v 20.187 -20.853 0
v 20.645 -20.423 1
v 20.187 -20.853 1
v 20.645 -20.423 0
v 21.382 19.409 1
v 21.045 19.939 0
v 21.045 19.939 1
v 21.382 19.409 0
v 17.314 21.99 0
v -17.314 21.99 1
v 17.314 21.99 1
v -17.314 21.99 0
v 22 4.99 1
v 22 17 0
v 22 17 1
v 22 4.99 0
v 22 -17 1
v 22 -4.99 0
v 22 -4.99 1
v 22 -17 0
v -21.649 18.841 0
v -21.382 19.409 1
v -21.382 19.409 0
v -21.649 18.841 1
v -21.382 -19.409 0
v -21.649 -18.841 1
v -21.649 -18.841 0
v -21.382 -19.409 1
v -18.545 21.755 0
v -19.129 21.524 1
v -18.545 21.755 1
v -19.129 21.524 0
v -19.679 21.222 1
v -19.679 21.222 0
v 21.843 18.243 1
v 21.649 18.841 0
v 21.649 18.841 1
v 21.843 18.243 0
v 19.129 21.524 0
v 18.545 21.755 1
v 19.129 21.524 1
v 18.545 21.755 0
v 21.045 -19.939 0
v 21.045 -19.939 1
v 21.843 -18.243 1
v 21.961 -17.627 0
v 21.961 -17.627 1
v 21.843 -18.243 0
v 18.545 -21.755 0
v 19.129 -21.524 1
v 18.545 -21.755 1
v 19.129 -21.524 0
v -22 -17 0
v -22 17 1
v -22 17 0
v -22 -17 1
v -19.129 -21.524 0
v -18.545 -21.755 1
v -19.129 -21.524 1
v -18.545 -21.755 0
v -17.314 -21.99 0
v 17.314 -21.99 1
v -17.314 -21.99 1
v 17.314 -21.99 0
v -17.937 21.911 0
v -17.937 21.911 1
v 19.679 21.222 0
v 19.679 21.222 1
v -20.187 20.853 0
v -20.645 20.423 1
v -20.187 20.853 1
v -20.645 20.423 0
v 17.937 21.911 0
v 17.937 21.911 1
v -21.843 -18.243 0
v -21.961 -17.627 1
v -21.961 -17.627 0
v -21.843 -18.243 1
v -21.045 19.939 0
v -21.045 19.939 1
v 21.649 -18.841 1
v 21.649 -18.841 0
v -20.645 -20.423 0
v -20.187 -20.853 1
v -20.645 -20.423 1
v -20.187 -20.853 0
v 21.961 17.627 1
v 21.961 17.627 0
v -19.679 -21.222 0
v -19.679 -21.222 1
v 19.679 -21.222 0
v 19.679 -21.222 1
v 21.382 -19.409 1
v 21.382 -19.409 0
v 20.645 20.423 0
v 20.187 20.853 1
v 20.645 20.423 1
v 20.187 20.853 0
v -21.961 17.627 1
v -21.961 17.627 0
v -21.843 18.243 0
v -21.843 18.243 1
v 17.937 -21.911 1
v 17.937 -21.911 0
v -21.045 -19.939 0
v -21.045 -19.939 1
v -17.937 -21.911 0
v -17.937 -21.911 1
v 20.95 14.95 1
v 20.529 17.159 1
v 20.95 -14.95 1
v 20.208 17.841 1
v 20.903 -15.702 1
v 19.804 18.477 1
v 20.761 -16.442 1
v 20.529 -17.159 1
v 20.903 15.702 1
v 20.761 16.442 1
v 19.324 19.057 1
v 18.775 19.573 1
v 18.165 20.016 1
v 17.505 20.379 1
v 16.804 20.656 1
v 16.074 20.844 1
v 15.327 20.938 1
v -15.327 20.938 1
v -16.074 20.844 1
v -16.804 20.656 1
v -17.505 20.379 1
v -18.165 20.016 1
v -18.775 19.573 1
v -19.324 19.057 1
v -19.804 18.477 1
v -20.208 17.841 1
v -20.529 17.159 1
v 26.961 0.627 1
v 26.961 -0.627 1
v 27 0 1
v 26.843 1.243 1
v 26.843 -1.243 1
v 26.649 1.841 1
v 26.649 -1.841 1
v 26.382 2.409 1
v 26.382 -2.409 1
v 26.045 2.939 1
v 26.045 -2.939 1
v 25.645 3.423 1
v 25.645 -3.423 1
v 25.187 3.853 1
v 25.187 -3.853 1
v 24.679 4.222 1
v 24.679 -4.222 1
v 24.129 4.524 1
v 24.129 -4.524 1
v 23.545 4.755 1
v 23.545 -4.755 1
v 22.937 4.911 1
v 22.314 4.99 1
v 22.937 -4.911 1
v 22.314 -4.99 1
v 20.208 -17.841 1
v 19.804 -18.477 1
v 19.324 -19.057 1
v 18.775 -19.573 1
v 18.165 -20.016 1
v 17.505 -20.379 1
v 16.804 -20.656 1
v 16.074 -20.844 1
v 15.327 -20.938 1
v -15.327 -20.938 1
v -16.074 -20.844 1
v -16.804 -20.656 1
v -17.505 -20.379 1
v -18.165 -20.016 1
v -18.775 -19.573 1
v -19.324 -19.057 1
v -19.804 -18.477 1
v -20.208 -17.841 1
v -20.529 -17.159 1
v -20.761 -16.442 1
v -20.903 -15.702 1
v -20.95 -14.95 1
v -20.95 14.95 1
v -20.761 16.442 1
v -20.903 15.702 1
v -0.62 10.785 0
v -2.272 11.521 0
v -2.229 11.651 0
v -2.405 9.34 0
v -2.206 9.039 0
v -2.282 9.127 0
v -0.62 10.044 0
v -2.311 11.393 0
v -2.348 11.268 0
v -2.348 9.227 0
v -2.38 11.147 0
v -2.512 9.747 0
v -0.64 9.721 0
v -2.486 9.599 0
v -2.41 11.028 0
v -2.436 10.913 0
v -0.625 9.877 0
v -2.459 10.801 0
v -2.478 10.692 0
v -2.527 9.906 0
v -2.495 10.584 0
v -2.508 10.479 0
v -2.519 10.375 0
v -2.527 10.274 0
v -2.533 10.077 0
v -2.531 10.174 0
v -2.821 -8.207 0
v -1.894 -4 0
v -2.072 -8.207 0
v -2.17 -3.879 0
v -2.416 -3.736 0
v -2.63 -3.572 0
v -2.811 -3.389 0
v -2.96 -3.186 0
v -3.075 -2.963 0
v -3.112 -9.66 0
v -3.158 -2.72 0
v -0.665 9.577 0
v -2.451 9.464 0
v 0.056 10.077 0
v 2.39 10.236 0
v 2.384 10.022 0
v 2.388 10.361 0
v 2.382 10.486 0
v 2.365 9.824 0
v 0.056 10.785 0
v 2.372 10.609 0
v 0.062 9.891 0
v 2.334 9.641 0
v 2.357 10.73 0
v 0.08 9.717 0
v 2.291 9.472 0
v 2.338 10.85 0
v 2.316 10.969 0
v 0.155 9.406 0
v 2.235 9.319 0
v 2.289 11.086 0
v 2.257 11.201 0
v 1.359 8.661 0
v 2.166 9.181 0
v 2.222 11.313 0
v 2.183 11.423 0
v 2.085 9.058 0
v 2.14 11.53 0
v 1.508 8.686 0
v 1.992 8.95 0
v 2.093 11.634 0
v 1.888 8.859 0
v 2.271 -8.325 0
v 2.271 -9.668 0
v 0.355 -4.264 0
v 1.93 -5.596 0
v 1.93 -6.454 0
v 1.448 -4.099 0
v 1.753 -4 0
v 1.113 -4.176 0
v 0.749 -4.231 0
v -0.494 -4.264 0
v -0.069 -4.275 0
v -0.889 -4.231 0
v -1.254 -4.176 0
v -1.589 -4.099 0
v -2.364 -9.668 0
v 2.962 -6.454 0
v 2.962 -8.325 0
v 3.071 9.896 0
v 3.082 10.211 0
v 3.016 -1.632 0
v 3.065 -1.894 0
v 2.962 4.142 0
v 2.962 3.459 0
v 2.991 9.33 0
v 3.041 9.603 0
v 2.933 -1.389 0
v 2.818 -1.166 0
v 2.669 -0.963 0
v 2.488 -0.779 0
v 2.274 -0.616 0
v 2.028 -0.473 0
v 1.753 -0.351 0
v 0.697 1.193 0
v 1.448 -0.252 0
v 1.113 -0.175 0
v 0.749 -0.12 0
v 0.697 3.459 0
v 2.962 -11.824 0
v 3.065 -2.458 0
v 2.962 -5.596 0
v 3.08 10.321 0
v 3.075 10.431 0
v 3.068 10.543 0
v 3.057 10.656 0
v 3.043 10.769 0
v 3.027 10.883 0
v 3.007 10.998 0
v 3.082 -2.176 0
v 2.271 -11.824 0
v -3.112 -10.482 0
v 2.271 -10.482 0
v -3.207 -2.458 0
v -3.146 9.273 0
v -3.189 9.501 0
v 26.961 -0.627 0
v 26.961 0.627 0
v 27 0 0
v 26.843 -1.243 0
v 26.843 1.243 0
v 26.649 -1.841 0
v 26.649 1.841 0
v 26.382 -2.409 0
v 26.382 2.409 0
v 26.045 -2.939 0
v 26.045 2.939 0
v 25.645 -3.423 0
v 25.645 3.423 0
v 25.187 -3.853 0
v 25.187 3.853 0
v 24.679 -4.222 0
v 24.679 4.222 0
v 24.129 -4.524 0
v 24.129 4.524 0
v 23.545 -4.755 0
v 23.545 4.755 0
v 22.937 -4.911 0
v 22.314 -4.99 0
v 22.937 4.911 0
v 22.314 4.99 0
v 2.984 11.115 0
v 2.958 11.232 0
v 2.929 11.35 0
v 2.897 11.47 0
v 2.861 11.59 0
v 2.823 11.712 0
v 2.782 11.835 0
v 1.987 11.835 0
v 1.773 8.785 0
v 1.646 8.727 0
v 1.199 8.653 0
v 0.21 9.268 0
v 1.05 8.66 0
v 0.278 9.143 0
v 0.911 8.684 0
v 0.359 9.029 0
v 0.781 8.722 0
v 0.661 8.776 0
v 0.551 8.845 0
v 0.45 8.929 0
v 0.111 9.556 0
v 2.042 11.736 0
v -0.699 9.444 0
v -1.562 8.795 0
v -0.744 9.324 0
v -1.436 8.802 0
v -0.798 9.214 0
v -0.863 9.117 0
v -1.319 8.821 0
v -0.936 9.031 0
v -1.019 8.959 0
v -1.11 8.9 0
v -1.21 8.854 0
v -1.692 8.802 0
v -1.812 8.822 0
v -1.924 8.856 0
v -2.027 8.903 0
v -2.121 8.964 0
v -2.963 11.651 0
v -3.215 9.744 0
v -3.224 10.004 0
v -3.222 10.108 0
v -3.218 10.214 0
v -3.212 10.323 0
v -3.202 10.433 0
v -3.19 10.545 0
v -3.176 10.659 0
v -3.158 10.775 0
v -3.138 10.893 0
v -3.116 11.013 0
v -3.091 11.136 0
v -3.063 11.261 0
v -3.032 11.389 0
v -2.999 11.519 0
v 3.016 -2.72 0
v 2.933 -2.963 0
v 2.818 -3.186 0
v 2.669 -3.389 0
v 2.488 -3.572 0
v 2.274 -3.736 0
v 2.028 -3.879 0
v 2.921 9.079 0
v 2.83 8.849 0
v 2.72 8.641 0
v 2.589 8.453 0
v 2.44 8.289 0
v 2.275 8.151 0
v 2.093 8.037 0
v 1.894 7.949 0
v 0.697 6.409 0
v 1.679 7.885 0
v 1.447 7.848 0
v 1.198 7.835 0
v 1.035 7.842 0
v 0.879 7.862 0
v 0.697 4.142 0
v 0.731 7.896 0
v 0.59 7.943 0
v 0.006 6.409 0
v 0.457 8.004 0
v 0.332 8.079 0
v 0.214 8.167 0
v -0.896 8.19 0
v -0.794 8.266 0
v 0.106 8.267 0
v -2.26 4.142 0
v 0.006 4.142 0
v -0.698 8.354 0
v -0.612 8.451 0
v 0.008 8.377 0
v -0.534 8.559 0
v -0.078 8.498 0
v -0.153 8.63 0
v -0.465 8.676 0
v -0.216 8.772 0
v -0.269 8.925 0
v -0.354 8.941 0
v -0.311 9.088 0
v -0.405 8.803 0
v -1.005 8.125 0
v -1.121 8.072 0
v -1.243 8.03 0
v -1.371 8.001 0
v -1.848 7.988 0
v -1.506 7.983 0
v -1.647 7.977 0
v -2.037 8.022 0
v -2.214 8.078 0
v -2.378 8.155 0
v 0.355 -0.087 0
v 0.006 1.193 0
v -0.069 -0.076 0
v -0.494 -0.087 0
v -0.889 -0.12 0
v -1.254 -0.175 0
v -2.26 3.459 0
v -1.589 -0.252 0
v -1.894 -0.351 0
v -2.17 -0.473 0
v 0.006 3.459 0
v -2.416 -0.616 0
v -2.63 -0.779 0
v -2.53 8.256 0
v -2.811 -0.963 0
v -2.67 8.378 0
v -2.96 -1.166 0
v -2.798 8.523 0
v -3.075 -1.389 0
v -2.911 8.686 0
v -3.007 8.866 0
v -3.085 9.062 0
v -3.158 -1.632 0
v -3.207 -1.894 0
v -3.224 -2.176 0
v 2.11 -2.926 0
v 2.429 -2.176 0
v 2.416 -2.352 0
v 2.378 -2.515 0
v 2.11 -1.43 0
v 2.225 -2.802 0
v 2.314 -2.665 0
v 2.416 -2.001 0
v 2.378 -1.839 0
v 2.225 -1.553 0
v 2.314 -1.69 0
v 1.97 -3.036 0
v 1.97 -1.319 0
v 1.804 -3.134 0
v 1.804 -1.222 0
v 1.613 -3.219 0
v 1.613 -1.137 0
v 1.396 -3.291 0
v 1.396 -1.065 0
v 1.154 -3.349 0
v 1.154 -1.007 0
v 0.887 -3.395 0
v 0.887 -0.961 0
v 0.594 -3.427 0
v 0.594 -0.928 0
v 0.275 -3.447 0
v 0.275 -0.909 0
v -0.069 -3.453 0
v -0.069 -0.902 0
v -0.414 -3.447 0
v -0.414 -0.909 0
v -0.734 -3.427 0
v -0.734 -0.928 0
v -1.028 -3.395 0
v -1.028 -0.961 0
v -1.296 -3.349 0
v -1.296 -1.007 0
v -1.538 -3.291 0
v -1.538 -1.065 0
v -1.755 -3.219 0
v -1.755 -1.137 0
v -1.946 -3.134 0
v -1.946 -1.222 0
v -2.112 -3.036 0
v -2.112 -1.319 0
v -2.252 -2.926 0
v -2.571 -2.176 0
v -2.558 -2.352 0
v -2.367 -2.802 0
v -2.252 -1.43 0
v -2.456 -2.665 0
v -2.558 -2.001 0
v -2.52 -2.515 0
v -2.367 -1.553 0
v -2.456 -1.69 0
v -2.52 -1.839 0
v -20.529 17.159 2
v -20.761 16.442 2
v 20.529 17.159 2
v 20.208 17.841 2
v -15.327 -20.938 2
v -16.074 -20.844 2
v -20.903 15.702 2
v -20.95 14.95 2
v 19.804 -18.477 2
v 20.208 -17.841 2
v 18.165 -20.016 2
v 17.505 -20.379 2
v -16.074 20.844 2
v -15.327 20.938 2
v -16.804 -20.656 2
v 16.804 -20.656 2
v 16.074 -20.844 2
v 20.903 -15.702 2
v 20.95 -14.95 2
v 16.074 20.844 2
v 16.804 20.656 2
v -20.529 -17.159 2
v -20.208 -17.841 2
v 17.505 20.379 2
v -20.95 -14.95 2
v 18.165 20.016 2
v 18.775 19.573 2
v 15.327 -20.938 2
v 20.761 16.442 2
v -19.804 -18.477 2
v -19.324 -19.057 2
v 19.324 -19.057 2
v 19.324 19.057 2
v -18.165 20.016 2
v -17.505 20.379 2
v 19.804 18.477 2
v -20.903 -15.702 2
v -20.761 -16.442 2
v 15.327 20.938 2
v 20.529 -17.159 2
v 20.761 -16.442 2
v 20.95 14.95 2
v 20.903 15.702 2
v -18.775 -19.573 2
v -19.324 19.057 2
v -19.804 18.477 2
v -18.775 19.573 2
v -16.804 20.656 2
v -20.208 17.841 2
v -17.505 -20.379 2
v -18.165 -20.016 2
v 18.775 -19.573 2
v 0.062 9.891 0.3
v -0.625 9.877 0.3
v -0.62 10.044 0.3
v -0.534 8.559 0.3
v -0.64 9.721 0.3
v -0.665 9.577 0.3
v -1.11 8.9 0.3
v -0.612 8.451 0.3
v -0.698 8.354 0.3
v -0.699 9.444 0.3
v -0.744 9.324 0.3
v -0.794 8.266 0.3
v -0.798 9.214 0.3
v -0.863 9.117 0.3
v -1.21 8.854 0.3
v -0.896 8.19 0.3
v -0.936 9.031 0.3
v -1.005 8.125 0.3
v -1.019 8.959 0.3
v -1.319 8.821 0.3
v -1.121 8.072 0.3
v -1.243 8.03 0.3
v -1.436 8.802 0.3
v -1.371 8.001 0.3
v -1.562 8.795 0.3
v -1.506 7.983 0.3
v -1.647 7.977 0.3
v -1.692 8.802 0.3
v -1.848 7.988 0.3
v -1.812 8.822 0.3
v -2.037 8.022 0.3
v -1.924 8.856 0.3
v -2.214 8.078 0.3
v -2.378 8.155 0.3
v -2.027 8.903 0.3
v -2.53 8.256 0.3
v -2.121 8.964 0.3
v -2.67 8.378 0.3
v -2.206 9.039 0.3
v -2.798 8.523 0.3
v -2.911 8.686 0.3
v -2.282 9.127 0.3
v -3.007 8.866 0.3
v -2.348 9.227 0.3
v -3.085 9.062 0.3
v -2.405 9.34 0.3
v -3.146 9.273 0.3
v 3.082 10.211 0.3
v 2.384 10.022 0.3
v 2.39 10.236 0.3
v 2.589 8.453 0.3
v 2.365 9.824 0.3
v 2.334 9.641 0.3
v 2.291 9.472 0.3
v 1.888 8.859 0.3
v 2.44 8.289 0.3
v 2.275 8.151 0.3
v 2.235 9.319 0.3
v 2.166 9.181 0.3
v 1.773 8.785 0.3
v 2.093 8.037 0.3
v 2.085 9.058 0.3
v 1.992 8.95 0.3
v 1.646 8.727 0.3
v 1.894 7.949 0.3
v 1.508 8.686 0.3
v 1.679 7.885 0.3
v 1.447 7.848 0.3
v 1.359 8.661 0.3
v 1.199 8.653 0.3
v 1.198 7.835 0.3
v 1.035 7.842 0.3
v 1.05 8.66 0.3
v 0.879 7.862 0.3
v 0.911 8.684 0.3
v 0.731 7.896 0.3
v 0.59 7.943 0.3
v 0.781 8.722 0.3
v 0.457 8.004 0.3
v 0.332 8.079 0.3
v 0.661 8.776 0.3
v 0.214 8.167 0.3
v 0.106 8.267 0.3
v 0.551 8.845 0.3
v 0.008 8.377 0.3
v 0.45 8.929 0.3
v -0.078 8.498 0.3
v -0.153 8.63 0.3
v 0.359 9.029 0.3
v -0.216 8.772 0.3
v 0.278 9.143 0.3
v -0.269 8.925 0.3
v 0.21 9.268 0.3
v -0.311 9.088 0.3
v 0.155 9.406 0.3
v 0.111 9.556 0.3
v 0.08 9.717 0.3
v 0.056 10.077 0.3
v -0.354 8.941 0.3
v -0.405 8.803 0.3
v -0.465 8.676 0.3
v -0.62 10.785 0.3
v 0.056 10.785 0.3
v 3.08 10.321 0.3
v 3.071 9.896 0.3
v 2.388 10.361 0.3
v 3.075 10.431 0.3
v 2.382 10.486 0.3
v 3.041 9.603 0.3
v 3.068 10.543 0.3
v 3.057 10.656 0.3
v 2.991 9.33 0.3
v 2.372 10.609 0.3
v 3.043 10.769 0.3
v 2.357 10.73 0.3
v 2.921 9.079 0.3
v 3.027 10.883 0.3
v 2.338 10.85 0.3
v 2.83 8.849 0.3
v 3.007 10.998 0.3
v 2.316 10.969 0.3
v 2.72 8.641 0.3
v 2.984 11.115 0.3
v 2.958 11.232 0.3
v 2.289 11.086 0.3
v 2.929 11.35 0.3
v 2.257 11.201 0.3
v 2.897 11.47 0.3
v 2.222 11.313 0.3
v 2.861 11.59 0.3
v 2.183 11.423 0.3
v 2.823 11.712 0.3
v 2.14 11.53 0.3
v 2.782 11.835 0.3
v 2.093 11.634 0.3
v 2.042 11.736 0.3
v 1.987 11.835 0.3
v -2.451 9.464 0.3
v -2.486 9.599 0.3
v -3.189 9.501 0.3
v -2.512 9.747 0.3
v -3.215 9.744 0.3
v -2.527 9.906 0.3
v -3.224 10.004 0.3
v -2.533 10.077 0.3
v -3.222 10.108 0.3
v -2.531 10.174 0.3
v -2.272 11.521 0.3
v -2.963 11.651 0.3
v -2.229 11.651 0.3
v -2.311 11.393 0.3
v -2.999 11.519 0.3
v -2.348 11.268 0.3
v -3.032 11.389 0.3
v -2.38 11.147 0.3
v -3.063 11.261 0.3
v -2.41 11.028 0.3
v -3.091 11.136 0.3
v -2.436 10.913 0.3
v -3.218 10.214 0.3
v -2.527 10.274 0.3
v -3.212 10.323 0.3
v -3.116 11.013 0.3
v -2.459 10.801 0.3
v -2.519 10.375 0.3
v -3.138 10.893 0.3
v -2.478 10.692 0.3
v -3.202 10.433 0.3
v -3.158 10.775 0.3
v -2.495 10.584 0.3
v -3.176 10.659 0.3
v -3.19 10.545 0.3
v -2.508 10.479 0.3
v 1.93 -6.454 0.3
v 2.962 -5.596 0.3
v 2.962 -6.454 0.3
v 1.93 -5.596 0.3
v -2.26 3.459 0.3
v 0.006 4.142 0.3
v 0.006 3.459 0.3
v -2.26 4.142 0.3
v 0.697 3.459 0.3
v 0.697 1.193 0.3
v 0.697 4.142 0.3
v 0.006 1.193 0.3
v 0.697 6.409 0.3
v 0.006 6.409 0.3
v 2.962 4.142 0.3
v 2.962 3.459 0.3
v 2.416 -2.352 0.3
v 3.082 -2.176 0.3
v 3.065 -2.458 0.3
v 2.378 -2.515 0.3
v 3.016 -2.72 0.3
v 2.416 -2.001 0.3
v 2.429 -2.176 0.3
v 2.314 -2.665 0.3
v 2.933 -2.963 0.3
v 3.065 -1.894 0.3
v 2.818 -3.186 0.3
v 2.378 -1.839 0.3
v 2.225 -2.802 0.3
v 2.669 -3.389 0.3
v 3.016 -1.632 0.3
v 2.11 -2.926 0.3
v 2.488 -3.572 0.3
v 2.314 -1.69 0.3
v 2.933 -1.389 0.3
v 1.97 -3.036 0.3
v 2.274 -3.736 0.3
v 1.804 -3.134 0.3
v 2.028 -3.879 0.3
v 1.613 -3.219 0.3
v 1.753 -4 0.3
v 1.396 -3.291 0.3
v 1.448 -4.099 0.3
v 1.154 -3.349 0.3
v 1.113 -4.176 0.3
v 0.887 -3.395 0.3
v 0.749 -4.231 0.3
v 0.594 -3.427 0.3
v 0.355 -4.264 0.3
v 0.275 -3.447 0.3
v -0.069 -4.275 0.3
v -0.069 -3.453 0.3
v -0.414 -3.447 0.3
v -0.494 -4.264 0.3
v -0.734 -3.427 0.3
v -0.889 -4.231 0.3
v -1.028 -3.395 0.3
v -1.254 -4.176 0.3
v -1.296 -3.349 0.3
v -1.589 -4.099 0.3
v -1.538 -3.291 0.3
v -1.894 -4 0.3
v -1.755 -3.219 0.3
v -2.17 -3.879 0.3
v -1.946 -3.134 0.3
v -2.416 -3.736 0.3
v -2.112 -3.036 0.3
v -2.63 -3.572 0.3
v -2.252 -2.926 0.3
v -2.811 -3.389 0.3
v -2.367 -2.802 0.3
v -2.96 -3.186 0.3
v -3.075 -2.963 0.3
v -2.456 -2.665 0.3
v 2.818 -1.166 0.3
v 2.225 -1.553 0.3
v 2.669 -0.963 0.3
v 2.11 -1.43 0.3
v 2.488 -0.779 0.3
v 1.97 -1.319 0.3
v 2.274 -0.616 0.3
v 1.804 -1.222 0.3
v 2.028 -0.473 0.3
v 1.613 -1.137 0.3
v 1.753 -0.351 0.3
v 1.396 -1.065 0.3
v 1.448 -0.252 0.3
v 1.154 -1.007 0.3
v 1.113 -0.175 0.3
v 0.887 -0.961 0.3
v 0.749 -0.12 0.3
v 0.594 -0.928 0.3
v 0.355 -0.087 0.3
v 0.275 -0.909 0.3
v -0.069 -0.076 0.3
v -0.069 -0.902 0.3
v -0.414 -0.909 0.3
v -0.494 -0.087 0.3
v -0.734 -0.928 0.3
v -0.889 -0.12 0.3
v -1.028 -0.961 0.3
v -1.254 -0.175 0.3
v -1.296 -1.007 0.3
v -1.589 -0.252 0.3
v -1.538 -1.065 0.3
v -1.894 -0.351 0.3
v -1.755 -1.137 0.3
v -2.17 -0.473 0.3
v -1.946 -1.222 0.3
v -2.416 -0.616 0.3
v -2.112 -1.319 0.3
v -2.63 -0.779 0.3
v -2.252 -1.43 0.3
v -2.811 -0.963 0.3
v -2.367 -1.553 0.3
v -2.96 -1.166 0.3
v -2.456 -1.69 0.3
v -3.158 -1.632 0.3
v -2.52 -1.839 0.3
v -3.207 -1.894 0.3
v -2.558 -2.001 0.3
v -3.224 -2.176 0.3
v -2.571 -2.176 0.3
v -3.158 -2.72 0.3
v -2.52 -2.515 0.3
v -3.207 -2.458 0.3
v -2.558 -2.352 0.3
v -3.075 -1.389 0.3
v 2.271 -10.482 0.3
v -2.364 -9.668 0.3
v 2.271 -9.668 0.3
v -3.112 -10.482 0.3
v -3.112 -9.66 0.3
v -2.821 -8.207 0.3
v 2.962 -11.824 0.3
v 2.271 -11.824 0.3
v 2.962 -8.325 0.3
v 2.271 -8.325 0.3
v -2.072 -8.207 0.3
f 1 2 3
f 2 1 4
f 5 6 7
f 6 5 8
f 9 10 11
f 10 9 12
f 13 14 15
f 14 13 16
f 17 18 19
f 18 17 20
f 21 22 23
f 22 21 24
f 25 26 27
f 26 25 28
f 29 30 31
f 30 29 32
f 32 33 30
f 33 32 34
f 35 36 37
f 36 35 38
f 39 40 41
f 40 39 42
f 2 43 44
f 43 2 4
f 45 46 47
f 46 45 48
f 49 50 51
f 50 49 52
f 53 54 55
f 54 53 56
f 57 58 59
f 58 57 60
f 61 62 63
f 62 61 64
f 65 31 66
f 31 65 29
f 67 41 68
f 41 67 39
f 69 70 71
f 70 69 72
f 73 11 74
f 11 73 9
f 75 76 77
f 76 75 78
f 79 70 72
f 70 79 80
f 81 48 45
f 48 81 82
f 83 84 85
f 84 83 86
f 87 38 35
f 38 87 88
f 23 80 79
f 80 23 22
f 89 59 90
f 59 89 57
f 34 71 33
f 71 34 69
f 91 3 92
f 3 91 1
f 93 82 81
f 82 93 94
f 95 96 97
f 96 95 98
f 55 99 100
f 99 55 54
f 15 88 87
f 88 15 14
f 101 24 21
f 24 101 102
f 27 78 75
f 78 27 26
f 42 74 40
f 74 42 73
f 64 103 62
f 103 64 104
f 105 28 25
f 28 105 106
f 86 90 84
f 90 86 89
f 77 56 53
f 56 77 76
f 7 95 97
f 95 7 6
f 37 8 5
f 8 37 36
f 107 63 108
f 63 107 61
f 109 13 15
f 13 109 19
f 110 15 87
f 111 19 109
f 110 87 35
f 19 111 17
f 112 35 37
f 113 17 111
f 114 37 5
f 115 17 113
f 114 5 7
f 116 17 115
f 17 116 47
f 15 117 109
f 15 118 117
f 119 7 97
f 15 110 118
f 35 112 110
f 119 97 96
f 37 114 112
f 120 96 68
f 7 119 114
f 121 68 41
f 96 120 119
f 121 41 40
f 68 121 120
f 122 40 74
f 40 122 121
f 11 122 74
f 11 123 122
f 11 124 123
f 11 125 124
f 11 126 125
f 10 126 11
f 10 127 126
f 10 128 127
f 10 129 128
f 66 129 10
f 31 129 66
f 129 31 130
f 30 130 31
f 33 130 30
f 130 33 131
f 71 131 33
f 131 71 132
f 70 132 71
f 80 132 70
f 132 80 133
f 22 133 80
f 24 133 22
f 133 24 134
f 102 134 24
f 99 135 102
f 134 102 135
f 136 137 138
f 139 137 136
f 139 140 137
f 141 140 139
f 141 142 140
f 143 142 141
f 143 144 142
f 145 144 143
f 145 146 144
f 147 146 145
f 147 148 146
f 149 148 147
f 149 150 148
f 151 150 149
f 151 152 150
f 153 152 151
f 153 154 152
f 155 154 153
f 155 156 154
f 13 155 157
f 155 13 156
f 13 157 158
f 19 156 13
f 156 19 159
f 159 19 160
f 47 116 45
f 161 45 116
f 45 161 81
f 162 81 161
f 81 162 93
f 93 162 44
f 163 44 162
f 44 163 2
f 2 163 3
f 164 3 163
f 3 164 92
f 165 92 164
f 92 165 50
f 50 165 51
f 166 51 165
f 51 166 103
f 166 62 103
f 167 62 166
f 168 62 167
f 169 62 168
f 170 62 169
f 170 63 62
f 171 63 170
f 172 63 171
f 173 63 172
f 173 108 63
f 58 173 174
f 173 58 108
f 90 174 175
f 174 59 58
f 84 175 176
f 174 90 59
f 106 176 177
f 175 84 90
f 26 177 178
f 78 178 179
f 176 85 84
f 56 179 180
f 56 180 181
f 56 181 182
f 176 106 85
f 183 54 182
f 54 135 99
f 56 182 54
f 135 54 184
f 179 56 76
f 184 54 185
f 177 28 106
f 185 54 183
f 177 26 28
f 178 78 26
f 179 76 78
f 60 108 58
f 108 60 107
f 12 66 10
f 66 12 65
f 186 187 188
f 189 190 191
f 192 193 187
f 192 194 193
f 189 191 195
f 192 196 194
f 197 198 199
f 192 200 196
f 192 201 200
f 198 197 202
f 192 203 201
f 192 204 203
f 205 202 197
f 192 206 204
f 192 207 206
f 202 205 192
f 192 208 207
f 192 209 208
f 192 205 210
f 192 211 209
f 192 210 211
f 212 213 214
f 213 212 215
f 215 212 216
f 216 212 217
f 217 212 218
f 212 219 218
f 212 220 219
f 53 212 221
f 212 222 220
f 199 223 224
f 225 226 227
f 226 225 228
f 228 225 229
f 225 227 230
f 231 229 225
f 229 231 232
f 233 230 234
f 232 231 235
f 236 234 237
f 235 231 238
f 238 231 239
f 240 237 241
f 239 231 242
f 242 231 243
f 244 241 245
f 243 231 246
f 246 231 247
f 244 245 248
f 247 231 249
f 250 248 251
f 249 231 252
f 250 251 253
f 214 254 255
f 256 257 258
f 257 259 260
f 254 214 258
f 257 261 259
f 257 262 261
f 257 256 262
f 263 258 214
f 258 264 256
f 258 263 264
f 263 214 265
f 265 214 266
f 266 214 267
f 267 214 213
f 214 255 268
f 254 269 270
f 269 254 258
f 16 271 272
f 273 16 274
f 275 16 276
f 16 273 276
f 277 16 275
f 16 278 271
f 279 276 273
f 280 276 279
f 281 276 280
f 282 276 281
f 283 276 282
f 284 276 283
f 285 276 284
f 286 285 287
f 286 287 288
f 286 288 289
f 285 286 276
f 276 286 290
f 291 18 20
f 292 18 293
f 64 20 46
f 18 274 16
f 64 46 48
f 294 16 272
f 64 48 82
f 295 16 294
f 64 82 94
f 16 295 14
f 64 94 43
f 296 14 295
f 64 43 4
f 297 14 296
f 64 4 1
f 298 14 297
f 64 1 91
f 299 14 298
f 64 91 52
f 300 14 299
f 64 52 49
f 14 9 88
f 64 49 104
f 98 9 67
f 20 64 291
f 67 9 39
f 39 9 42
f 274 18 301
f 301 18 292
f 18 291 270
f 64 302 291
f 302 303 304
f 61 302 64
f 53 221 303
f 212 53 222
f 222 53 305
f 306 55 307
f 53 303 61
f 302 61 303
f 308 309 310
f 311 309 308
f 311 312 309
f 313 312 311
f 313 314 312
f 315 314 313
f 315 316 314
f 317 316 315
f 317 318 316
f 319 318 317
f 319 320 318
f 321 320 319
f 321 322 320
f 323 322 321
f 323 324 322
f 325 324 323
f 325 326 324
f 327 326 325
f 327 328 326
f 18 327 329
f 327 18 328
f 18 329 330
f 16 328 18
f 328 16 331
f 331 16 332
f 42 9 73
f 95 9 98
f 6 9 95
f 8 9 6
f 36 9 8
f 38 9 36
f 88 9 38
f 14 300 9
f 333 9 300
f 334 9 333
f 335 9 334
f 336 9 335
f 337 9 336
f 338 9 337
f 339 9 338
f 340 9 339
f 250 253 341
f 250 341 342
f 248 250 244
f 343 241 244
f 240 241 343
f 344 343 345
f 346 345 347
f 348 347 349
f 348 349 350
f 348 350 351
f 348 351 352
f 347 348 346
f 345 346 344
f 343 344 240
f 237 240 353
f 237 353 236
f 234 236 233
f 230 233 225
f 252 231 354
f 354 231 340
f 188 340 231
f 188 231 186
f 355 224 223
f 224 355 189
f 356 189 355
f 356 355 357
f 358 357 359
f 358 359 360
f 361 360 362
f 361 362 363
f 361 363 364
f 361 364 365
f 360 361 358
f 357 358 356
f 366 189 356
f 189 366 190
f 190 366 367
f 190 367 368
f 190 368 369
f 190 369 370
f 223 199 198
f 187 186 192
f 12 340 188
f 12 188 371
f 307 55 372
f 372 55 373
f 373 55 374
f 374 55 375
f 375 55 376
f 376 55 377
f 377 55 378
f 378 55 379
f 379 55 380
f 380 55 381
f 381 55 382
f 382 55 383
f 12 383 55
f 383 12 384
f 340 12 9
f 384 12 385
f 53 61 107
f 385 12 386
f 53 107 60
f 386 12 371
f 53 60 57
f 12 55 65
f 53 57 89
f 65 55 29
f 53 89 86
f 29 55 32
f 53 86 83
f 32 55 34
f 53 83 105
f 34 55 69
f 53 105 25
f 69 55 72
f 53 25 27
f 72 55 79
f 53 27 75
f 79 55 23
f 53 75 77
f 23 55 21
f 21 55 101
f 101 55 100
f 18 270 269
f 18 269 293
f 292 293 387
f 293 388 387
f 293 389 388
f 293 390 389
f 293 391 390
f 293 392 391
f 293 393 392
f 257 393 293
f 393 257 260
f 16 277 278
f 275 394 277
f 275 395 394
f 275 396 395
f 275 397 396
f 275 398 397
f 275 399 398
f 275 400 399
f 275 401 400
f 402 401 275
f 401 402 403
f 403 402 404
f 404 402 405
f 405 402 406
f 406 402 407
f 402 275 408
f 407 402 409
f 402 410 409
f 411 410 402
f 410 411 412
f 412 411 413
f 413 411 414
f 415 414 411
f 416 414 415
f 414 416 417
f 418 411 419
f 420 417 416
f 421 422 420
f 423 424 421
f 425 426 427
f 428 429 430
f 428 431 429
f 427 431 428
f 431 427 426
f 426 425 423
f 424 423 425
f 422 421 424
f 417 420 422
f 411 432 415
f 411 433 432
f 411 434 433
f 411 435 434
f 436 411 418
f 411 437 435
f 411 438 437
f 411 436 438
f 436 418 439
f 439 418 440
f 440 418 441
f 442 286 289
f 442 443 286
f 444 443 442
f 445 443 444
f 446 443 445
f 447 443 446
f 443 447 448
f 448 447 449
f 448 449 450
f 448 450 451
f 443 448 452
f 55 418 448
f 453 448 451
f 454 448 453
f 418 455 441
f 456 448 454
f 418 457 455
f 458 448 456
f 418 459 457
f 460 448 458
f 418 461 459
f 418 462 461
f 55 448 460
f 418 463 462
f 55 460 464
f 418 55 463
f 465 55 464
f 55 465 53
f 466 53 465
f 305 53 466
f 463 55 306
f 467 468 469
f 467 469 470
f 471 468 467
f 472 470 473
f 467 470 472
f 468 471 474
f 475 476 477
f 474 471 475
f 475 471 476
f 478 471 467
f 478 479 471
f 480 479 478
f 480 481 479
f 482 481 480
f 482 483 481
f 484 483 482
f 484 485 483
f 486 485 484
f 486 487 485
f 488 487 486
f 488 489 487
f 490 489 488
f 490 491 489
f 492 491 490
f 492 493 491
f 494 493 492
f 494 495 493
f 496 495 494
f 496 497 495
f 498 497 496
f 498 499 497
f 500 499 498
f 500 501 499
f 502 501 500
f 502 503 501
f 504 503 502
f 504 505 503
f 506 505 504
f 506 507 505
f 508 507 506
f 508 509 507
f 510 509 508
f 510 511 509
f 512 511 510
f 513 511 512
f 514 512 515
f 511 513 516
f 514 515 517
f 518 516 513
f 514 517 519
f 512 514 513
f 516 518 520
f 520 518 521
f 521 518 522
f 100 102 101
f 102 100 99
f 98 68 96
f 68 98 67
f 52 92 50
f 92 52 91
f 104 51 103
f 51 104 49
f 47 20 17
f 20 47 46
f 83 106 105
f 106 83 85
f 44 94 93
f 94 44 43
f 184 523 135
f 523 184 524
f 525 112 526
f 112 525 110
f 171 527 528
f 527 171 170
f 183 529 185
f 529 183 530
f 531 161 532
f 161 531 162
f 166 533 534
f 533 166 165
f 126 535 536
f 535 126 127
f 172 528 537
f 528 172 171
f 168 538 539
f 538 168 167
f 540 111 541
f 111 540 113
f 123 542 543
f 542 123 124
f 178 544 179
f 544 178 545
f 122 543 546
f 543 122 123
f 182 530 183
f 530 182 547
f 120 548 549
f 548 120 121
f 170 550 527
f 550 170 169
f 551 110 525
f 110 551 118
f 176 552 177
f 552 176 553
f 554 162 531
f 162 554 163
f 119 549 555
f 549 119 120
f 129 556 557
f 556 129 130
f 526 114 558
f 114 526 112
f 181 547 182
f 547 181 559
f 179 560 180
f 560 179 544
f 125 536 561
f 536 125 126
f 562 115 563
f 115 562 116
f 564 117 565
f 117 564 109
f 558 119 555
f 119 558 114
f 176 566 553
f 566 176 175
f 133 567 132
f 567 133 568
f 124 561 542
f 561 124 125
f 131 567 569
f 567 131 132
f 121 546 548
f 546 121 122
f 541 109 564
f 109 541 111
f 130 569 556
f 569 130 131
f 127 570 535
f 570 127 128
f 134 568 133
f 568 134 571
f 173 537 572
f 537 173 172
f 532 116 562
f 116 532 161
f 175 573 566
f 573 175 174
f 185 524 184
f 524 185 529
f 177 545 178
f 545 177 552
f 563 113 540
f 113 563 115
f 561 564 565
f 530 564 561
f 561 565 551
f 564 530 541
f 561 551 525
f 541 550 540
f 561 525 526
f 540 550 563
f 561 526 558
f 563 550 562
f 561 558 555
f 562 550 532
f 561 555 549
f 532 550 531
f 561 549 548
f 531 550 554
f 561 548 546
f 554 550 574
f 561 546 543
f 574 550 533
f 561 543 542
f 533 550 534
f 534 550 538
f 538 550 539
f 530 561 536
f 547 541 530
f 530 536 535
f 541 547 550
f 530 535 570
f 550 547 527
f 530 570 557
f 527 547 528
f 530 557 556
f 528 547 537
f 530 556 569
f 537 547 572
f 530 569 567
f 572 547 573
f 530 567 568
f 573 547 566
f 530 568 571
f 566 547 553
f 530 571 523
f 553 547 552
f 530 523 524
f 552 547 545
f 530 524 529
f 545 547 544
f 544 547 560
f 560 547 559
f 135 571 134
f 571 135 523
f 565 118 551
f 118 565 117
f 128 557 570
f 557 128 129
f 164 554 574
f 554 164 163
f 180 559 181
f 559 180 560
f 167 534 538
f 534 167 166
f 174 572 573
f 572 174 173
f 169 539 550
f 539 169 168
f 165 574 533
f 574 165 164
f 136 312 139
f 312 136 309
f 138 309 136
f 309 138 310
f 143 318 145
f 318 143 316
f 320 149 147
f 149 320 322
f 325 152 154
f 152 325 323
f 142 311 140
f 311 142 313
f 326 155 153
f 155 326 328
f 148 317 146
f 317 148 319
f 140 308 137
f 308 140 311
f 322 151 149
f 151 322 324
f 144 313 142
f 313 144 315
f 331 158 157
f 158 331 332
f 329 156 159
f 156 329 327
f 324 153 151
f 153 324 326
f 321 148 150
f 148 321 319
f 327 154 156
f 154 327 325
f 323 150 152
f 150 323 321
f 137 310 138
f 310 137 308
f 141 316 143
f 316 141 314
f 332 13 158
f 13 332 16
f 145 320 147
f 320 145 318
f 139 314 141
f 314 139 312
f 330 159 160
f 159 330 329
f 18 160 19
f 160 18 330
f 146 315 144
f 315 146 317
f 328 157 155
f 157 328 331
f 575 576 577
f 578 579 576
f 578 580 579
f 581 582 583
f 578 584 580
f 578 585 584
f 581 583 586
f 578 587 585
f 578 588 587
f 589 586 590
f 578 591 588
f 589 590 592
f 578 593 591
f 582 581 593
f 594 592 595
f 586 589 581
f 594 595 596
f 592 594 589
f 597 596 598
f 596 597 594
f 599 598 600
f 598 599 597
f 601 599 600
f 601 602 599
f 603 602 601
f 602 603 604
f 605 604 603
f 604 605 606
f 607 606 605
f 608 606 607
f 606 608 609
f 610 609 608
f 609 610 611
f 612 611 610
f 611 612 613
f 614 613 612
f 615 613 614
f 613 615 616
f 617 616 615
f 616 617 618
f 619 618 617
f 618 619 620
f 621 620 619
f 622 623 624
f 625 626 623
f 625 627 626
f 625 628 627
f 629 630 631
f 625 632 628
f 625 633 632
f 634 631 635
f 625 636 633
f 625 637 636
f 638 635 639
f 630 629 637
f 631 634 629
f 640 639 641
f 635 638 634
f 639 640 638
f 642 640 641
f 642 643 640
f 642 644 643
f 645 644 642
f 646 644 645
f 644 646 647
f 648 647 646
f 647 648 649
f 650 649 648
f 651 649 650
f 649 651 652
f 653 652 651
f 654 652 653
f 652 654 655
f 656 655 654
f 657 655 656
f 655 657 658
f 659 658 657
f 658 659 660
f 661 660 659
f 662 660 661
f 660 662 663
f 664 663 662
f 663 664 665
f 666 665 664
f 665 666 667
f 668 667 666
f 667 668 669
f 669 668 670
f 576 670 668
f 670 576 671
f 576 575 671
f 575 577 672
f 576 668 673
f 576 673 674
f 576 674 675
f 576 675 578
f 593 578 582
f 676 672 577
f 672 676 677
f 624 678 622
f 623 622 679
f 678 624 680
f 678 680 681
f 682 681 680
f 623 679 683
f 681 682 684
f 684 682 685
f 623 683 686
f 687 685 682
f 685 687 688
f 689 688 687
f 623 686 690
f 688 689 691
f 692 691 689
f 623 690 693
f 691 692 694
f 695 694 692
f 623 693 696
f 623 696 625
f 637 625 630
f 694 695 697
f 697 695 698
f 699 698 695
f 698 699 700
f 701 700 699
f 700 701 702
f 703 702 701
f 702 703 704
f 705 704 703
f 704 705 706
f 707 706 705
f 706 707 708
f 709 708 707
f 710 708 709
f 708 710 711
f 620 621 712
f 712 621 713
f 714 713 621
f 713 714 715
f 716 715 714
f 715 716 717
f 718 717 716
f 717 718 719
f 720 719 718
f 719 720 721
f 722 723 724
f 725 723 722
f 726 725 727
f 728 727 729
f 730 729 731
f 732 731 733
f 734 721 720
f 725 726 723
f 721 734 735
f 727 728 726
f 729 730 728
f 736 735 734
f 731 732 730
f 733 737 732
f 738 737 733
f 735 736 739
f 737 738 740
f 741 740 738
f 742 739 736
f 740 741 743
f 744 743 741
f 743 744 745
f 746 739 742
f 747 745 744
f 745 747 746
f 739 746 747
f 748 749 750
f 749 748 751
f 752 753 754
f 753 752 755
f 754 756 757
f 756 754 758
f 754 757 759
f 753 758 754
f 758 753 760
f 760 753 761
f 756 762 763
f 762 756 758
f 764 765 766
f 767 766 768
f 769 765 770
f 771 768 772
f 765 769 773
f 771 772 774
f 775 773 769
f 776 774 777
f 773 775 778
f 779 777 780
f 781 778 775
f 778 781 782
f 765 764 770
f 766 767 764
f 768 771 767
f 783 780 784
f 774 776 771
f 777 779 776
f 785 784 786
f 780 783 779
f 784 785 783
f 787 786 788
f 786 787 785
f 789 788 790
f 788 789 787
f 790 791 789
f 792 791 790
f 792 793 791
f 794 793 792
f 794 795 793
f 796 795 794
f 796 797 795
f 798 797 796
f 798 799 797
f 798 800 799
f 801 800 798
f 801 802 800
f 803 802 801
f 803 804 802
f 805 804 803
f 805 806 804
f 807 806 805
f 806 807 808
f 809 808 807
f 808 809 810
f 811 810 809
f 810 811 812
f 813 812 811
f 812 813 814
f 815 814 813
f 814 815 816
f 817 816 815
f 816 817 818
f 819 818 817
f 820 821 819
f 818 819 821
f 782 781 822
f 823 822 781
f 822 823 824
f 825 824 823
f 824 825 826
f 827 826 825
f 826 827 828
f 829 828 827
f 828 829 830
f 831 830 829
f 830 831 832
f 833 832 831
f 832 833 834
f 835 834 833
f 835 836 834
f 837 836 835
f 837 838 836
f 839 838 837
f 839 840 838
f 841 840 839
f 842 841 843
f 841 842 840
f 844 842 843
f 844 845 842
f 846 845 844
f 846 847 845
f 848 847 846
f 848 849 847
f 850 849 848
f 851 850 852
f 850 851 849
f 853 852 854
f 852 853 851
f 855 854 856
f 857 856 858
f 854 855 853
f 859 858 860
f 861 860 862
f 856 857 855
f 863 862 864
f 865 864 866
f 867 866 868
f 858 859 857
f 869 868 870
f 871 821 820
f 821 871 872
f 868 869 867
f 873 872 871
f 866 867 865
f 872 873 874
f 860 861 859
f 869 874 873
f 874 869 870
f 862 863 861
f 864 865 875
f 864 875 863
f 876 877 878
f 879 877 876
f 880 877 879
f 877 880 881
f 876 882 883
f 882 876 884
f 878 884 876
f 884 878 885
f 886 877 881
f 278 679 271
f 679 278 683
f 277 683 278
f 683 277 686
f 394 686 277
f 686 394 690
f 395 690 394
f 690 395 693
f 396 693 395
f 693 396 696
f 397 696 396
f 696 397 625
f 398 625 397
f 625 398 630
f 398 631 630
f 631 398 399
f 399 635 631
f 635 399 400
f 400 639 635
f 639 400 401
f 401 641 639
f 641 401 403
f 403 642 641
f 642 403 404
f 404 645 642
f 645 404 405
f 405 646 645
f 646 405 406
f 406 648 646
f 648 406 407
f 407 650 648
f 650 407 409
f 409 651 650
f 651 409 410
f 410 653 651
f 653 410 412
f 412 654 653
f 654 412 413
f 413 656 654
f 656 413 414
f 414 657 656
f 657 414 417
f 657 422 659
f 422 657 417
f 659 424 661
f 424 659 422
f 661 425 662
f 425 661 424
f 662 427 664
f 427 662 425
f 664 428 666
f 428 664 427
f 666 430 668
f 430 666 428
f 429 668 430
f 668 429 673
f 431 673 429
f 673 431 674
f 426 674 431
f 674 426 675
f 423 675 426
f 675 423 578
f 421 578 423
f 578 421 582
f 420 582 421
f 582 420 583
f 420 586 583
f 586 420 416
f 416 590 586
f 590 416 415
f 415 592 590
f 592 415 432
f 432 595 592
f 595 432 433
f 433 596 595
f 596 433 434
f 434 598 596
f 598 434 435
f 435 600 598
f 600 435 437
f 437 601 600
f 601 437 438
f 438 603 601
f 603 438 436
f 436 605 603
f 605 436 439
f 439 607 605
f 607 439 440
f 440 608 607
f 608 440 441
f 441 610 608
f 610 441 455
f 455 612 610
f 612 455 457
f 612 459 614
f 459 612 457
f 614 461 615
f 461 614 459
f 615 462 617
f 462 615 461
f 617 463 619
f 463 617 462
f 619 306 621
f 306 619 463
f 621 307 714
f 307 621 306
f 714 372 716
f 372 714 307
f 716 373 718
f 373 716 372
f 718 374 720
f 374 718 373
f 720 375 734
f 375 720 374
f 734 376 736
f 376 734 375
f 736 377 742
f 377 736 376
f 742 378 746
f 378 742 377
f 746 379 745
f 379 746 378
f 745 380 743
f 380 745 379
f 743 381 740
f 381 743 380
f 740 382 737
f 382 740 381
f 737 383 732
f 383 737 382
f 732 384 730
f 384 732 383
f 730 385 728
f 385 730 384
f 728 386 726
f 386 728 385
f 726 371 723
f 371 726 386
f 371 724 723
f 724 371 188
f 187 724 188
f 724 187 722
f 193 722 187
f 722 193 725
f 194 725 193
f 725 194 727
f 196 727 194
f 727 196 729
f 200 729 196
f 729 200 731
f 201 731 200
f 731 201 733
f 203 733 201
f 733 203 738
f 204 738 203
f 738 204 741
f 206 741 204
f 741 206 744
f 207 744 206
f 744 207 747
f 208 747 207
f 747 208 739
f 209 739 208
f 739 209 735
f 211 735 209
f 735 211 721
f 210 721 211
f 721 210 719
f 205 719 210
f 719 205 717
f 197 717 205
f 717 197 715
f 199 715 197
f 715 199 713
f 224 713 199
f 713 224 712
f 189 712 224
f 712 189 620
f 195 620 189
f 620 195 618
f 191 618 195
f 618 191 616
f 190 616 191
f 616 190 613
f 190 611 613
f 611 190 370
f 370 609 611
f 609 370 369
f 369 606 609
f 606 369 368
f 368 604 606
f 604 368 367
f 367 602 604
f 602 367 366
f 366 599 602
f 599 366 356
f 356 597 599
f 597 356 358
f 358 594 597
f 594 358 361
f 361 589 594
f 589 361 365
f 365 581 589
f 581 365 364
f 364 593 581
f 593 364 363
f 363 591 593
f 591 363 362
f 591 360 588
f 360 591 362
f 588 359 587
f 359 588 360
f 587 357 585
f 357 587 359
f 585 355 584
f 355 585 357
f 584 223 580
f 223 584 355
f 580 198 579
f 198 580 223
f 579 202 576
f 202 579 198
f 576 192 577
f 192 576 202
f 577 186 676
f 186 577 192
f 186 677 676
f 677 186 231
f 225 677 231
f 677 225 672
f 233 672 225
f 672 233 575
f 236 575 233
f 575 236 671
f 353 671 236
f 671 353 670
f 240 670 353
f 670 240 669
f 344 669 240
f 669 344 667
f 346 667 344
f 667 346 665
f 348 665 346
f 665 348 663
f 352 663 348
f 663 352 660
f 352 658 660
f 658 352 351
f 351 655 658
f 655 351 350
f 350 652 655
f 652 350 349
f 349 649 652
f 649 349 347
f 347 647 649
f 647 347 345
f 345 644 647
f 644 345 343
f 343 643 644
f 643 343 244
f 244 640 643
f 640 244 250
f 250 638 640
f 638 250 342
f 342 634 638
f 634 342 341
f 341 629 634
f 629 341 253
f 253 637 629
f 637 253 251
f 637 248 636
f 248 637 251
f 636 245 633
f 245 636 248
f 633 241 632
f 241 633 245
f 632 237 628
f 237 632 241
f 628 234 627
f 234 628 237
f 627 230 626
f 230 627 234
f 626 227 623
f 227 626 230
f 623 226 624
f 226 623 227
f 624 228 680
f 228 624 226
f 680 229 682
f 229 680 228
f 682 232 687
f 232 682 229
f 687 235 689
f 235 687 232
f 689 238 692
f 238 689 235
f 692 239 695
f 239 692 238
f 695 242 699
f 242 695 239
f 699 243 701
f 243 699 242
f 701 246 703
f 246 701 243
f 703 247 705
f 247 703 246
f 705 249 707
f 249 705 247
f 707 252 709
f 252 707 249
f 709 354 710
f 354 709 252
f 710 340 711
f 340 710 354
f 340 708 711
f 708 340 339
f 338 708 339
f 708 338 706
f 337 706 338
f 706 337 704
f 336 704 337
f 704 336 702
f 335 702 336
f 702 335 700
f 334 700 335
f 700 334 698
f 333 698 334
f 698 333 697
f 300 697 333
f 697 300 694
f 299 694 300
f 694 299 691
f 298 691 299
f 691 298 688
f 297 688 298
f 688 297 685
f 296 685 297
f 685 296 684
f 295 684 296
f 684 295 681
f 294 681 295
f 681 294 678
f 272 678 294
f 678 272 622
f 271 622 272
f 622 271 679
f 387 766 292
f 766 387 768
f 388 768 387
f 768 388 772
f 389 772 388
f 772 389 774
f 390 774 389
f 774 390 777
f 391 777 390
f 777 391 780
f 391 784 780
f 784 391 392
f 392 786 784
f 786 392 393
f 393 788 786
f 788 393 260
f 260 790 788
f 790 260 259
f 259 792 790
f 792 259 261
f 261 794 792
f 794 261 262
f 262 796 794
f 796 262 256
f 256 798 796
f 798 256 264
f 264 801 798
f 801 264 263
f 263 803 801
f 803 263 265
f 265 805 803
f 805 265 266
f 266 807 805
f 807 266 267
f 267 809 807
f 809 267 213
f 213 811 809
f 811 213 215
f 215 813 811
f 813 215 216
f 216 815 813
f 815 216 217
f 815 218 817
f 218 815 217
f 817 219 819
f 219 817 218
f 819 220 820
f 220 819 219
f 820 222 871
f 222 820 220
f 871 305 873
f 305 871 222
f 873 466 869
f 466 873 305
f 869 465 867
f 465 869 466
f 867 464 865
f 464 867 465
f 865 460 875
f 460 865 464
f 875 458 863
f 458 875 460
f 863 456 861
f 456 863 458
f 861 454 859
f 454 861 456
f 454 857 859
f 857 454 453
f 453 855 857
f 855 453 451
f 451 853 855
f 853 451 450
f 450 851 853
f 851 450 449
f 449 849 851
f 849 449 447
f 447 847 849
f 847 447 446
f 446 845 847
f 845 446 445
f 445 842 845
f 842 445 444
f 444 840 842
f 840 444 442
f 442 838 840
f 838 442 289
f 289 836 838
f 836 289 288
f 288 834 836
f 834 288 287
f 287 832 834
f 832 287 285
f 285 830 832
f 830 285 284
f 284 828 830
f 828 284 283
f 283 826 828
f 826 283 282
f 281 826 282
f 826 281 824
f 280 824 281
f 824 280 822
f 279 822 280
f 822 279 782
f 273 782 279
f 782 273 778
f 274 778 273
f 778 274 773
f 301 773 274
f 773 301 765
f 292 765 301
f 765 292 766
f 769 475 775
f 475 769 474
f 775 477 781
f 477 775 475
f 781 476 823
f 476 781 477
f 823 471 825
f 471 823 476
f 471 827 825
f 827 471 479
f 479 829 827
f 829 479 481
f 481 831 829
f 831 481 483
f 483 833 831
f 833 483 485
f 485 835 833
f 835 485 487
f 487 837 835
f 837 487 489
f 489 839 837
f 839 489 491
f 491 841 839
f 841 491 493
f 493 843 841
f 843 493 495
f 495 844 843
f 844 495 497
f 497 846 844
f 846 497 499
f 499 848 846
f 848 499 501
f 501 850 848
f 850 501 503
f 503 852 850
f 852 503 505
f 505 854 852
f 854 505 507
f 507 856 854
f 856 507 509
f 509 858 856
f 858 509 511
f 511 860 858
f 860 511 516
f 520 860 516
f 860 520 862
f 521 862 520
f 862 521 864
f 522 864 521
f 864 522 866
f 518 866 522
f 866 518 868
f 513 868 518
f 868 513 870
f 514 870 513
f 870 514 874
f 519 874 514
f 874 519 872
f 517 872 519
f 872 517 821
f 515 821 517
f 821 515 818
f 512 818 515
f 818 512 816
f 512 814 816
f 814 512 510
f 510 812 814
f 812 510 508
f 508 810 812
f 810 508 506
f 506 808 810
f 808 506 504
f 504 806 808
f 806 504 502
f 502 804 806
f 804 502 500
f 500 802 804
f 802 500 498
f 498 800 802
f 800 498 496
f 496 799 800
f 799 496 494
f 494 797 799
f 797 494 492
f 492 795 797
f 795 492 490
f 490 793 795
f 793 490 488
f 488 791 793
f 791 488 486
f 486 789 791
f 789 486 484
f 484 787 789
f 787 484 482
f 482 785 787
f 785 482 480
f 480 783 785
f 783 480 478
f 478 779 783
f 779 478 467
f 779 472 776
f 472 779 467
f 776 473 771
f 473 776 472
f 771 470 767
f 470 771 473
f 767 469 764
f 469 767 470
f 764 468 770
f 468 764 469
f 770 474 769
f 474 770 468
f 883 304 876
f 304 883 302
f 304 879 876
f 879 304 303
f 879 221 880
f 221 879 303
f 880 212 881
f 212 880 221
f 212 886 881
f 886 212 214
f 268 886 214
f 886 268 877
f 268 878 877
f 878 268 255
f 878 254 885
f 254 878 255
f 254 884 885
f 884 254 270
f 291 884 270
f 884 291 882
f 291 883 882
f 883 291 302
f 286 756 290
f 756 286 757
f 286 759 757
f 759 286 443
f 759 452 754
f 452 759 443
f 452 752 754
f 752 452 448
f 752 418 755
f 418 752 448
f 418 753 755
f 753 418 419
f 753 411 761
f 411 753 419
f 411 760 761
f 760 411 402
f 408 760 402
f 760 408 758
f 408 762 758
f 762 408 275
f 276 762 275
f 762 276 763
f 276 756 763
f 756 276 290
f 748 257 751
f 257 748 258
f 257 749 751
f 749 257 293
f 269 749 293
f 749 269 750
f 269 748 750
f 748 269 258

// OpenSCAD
$fn = 50;


difference() {
	union() {
		translate(v = [0, 0, 0]) {
			rotate(a = [0, 0, 0]) {
				hull() {
					translate(v = [-17.0000000000, 17.0000000000, 0]) {
						rotate(a = [0, 0, 0]) {
							translate(v = [0, 0, 0]) {
								rotate(a = [0, 0, 0]) {
									cylinder(h = 1, r = 5);
								}
							}
						}
					}
					translate(v = [17.0000000000, 17.0000000000, 0]) {
						rotate(a = [0, 0, 0]) {
							translate(v = [0, 0, 0]) {
								rotate(a = [0, 0, 0]) {
									cylinder(h = 1, r = 5);
								}
							}
						}
					}
					translate(v = [-17.0000000000, -17.0000000000, 0]) {
						rotate(a = [0, 0, 0]) {
							translate(v = [0, 0, 0]) {
								rotate(a = [0, 0, 0]) {
									cylinder(h = 1, r = 5);
								}
							}
						}
					}
					translate(v = [17.0000000000, -17.0000000000, 0]) {
						rotate(a = [0, 0, 0]) {
							translate(v = [0, 0, 0]) {
								rotate(a = [0, 0, 0]) {
									cylinder(h = 1, r = 5);
								}
							}
						}
					}
				}
			}
		}
		translate(v = [0, 0, 0]) {
			rotate(a = [0, 0, 0]) {
				hull() {
					translate(v = [-14.9500000000, 14.9500000000, 0]) {
						rotate(a = [0, 0, 0]) {
							translate(v = [0, 0, 0]) {
								rotate(a = [0, 0, 0]) {
									cylinder(h = 2, r = 6);
								}
							}
						}
					}
					translate(v = [14.9500000000, 14.9500000000, 0]) {
						rotate(a = [0, 0, 0]) {
							translate(v = [0, 0, 0]) {
								rotate(a = [0, 0, 0]) {
									cylinder(h = 2, r = 6);
								}
							}
						}
					}
					translate(v = [-14.9500000000, -14.9500000000, 0]) {
						rotate(a = [0, 0, 0]) {
							translate(v = [0, 0, 0]) {
								rotate(a = [0, 0, 0]) {
									cylinder(h = 2, r = 6);
								}
							}
						}
					}
					translate(v = [14.9500000000, -14.9500000000, 0]) {
						rotate(a = [0, 0, 0]) {
							translate(v = [0, 0, 0]) {
								rotate(a = [0, 0, 0]) {
									cylinder(h = 2, r = 6);
								}
							}
						}
					}
				}
			}
		}
		translate(v = [22.0000000000, 0, 0.0000000000]) {
			rotate(a = [0, 0, 0]) {
				cylinder(h = 1, r = 5);
			}
		}
	}
	union() {
		translate(v = [0, 0, 0.3000000000]) {
			rotate(a = [0, 180, 90]) {
				linear_extrude(height = 0.3000000000) {
					text(font = "Candara:Light", halign = "center", size = 6, text = "3+0.1", valign = "center");
				}
			}
		}
	}
}
